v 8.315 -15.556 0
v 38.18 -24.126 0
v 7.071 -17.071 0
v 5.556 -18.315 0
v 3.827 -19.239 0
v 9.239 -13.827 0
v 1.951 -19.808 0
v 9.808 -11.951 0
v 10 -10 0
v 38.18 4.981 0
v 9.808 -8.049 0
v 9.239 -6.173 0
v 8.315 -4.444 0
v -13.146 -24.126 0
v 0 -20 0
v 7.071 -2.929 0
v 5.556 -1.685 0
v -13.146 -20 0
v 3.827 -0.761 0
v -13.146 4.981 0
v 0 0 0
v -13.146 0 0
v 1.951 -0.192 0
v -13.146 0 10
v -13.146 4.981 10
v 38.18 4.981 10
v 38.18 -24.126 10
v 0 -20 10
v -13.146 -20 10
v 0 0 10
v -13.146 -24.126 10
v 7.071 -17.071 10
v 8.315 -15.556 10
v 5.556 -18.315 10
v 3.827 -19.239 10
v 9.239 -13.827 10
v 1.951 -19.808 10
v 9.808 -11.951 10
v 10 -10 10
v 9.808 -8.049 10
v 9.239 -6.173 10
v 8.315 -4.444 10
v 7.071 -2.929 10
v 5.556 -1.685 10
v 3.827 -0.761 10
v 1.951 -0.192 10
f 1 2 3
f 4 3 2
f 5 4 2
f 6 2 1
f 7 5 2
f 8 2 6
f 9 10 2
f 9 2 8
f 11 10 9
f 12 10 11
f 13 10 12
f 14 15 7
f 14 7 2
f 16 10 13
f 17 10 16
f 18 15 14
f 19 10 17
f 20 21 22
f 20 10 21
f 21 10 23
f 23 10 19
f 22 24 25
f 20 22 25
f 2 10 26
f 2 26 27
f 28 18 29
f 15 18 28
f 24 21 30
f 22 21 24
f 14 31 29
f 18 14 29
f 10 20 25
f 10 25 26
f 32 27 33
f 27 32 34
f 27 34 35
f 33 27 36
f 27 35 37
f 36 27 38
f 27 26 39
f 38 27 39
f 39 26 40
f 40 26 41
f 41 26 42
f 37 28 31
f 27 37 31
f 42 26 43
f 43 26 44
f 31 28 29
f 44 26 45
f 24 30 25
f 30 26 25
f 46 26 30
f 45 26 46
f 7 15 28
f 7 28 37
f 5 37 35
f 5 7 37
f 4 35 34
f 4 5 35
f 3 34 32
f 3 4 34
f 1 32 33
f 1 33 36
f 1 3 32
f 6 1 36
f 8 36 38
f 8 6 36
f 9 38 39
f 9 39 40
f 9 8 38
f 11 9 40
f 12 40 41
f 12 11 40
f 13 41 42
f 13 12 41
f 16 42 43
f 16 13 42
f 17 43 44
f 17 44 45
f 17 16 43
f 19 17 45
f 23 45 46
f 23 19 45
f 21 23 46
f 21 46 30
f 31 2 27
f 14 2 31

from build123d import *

# Parameters (mm, degrees)
BOSS_EXTRUDE1_DEPTH = 10


with BuildPart() as part:
    # Sketch1 → Boss-Extrude1 (new body)
    with BuildSketch(Plane.XY):
        with BuildLine():
            Line((0, 4.980997276), (38.18012487, 4.980997276))
            Line((38.18012487, 4.980997276), (38.18012487, -24.126325443))
            Line((38.18012487, -24.126325443), (0, -24.126325443))
            Line((0, -24.126325443), (-13.14596048, -24.126325443))
            Line((-13.14596048, -24.126325443), (-13.14596048, -20))
            Line((-13.14596048, -20), (0, -20))
            ThreePointArc((0, -20), (10, -10), (0, 0))
            Line((0, 0), (-13.14596048, 0))
            Line((-13.14596048, 0), (-13.14596048, 4.980997276))
            Line((-13.14596048, 4.980997276), (0, 4.980997276))
        make_face()
    extrude(amount=BOSS_EXTRUDE1_DEPTH)


solid = part.part
